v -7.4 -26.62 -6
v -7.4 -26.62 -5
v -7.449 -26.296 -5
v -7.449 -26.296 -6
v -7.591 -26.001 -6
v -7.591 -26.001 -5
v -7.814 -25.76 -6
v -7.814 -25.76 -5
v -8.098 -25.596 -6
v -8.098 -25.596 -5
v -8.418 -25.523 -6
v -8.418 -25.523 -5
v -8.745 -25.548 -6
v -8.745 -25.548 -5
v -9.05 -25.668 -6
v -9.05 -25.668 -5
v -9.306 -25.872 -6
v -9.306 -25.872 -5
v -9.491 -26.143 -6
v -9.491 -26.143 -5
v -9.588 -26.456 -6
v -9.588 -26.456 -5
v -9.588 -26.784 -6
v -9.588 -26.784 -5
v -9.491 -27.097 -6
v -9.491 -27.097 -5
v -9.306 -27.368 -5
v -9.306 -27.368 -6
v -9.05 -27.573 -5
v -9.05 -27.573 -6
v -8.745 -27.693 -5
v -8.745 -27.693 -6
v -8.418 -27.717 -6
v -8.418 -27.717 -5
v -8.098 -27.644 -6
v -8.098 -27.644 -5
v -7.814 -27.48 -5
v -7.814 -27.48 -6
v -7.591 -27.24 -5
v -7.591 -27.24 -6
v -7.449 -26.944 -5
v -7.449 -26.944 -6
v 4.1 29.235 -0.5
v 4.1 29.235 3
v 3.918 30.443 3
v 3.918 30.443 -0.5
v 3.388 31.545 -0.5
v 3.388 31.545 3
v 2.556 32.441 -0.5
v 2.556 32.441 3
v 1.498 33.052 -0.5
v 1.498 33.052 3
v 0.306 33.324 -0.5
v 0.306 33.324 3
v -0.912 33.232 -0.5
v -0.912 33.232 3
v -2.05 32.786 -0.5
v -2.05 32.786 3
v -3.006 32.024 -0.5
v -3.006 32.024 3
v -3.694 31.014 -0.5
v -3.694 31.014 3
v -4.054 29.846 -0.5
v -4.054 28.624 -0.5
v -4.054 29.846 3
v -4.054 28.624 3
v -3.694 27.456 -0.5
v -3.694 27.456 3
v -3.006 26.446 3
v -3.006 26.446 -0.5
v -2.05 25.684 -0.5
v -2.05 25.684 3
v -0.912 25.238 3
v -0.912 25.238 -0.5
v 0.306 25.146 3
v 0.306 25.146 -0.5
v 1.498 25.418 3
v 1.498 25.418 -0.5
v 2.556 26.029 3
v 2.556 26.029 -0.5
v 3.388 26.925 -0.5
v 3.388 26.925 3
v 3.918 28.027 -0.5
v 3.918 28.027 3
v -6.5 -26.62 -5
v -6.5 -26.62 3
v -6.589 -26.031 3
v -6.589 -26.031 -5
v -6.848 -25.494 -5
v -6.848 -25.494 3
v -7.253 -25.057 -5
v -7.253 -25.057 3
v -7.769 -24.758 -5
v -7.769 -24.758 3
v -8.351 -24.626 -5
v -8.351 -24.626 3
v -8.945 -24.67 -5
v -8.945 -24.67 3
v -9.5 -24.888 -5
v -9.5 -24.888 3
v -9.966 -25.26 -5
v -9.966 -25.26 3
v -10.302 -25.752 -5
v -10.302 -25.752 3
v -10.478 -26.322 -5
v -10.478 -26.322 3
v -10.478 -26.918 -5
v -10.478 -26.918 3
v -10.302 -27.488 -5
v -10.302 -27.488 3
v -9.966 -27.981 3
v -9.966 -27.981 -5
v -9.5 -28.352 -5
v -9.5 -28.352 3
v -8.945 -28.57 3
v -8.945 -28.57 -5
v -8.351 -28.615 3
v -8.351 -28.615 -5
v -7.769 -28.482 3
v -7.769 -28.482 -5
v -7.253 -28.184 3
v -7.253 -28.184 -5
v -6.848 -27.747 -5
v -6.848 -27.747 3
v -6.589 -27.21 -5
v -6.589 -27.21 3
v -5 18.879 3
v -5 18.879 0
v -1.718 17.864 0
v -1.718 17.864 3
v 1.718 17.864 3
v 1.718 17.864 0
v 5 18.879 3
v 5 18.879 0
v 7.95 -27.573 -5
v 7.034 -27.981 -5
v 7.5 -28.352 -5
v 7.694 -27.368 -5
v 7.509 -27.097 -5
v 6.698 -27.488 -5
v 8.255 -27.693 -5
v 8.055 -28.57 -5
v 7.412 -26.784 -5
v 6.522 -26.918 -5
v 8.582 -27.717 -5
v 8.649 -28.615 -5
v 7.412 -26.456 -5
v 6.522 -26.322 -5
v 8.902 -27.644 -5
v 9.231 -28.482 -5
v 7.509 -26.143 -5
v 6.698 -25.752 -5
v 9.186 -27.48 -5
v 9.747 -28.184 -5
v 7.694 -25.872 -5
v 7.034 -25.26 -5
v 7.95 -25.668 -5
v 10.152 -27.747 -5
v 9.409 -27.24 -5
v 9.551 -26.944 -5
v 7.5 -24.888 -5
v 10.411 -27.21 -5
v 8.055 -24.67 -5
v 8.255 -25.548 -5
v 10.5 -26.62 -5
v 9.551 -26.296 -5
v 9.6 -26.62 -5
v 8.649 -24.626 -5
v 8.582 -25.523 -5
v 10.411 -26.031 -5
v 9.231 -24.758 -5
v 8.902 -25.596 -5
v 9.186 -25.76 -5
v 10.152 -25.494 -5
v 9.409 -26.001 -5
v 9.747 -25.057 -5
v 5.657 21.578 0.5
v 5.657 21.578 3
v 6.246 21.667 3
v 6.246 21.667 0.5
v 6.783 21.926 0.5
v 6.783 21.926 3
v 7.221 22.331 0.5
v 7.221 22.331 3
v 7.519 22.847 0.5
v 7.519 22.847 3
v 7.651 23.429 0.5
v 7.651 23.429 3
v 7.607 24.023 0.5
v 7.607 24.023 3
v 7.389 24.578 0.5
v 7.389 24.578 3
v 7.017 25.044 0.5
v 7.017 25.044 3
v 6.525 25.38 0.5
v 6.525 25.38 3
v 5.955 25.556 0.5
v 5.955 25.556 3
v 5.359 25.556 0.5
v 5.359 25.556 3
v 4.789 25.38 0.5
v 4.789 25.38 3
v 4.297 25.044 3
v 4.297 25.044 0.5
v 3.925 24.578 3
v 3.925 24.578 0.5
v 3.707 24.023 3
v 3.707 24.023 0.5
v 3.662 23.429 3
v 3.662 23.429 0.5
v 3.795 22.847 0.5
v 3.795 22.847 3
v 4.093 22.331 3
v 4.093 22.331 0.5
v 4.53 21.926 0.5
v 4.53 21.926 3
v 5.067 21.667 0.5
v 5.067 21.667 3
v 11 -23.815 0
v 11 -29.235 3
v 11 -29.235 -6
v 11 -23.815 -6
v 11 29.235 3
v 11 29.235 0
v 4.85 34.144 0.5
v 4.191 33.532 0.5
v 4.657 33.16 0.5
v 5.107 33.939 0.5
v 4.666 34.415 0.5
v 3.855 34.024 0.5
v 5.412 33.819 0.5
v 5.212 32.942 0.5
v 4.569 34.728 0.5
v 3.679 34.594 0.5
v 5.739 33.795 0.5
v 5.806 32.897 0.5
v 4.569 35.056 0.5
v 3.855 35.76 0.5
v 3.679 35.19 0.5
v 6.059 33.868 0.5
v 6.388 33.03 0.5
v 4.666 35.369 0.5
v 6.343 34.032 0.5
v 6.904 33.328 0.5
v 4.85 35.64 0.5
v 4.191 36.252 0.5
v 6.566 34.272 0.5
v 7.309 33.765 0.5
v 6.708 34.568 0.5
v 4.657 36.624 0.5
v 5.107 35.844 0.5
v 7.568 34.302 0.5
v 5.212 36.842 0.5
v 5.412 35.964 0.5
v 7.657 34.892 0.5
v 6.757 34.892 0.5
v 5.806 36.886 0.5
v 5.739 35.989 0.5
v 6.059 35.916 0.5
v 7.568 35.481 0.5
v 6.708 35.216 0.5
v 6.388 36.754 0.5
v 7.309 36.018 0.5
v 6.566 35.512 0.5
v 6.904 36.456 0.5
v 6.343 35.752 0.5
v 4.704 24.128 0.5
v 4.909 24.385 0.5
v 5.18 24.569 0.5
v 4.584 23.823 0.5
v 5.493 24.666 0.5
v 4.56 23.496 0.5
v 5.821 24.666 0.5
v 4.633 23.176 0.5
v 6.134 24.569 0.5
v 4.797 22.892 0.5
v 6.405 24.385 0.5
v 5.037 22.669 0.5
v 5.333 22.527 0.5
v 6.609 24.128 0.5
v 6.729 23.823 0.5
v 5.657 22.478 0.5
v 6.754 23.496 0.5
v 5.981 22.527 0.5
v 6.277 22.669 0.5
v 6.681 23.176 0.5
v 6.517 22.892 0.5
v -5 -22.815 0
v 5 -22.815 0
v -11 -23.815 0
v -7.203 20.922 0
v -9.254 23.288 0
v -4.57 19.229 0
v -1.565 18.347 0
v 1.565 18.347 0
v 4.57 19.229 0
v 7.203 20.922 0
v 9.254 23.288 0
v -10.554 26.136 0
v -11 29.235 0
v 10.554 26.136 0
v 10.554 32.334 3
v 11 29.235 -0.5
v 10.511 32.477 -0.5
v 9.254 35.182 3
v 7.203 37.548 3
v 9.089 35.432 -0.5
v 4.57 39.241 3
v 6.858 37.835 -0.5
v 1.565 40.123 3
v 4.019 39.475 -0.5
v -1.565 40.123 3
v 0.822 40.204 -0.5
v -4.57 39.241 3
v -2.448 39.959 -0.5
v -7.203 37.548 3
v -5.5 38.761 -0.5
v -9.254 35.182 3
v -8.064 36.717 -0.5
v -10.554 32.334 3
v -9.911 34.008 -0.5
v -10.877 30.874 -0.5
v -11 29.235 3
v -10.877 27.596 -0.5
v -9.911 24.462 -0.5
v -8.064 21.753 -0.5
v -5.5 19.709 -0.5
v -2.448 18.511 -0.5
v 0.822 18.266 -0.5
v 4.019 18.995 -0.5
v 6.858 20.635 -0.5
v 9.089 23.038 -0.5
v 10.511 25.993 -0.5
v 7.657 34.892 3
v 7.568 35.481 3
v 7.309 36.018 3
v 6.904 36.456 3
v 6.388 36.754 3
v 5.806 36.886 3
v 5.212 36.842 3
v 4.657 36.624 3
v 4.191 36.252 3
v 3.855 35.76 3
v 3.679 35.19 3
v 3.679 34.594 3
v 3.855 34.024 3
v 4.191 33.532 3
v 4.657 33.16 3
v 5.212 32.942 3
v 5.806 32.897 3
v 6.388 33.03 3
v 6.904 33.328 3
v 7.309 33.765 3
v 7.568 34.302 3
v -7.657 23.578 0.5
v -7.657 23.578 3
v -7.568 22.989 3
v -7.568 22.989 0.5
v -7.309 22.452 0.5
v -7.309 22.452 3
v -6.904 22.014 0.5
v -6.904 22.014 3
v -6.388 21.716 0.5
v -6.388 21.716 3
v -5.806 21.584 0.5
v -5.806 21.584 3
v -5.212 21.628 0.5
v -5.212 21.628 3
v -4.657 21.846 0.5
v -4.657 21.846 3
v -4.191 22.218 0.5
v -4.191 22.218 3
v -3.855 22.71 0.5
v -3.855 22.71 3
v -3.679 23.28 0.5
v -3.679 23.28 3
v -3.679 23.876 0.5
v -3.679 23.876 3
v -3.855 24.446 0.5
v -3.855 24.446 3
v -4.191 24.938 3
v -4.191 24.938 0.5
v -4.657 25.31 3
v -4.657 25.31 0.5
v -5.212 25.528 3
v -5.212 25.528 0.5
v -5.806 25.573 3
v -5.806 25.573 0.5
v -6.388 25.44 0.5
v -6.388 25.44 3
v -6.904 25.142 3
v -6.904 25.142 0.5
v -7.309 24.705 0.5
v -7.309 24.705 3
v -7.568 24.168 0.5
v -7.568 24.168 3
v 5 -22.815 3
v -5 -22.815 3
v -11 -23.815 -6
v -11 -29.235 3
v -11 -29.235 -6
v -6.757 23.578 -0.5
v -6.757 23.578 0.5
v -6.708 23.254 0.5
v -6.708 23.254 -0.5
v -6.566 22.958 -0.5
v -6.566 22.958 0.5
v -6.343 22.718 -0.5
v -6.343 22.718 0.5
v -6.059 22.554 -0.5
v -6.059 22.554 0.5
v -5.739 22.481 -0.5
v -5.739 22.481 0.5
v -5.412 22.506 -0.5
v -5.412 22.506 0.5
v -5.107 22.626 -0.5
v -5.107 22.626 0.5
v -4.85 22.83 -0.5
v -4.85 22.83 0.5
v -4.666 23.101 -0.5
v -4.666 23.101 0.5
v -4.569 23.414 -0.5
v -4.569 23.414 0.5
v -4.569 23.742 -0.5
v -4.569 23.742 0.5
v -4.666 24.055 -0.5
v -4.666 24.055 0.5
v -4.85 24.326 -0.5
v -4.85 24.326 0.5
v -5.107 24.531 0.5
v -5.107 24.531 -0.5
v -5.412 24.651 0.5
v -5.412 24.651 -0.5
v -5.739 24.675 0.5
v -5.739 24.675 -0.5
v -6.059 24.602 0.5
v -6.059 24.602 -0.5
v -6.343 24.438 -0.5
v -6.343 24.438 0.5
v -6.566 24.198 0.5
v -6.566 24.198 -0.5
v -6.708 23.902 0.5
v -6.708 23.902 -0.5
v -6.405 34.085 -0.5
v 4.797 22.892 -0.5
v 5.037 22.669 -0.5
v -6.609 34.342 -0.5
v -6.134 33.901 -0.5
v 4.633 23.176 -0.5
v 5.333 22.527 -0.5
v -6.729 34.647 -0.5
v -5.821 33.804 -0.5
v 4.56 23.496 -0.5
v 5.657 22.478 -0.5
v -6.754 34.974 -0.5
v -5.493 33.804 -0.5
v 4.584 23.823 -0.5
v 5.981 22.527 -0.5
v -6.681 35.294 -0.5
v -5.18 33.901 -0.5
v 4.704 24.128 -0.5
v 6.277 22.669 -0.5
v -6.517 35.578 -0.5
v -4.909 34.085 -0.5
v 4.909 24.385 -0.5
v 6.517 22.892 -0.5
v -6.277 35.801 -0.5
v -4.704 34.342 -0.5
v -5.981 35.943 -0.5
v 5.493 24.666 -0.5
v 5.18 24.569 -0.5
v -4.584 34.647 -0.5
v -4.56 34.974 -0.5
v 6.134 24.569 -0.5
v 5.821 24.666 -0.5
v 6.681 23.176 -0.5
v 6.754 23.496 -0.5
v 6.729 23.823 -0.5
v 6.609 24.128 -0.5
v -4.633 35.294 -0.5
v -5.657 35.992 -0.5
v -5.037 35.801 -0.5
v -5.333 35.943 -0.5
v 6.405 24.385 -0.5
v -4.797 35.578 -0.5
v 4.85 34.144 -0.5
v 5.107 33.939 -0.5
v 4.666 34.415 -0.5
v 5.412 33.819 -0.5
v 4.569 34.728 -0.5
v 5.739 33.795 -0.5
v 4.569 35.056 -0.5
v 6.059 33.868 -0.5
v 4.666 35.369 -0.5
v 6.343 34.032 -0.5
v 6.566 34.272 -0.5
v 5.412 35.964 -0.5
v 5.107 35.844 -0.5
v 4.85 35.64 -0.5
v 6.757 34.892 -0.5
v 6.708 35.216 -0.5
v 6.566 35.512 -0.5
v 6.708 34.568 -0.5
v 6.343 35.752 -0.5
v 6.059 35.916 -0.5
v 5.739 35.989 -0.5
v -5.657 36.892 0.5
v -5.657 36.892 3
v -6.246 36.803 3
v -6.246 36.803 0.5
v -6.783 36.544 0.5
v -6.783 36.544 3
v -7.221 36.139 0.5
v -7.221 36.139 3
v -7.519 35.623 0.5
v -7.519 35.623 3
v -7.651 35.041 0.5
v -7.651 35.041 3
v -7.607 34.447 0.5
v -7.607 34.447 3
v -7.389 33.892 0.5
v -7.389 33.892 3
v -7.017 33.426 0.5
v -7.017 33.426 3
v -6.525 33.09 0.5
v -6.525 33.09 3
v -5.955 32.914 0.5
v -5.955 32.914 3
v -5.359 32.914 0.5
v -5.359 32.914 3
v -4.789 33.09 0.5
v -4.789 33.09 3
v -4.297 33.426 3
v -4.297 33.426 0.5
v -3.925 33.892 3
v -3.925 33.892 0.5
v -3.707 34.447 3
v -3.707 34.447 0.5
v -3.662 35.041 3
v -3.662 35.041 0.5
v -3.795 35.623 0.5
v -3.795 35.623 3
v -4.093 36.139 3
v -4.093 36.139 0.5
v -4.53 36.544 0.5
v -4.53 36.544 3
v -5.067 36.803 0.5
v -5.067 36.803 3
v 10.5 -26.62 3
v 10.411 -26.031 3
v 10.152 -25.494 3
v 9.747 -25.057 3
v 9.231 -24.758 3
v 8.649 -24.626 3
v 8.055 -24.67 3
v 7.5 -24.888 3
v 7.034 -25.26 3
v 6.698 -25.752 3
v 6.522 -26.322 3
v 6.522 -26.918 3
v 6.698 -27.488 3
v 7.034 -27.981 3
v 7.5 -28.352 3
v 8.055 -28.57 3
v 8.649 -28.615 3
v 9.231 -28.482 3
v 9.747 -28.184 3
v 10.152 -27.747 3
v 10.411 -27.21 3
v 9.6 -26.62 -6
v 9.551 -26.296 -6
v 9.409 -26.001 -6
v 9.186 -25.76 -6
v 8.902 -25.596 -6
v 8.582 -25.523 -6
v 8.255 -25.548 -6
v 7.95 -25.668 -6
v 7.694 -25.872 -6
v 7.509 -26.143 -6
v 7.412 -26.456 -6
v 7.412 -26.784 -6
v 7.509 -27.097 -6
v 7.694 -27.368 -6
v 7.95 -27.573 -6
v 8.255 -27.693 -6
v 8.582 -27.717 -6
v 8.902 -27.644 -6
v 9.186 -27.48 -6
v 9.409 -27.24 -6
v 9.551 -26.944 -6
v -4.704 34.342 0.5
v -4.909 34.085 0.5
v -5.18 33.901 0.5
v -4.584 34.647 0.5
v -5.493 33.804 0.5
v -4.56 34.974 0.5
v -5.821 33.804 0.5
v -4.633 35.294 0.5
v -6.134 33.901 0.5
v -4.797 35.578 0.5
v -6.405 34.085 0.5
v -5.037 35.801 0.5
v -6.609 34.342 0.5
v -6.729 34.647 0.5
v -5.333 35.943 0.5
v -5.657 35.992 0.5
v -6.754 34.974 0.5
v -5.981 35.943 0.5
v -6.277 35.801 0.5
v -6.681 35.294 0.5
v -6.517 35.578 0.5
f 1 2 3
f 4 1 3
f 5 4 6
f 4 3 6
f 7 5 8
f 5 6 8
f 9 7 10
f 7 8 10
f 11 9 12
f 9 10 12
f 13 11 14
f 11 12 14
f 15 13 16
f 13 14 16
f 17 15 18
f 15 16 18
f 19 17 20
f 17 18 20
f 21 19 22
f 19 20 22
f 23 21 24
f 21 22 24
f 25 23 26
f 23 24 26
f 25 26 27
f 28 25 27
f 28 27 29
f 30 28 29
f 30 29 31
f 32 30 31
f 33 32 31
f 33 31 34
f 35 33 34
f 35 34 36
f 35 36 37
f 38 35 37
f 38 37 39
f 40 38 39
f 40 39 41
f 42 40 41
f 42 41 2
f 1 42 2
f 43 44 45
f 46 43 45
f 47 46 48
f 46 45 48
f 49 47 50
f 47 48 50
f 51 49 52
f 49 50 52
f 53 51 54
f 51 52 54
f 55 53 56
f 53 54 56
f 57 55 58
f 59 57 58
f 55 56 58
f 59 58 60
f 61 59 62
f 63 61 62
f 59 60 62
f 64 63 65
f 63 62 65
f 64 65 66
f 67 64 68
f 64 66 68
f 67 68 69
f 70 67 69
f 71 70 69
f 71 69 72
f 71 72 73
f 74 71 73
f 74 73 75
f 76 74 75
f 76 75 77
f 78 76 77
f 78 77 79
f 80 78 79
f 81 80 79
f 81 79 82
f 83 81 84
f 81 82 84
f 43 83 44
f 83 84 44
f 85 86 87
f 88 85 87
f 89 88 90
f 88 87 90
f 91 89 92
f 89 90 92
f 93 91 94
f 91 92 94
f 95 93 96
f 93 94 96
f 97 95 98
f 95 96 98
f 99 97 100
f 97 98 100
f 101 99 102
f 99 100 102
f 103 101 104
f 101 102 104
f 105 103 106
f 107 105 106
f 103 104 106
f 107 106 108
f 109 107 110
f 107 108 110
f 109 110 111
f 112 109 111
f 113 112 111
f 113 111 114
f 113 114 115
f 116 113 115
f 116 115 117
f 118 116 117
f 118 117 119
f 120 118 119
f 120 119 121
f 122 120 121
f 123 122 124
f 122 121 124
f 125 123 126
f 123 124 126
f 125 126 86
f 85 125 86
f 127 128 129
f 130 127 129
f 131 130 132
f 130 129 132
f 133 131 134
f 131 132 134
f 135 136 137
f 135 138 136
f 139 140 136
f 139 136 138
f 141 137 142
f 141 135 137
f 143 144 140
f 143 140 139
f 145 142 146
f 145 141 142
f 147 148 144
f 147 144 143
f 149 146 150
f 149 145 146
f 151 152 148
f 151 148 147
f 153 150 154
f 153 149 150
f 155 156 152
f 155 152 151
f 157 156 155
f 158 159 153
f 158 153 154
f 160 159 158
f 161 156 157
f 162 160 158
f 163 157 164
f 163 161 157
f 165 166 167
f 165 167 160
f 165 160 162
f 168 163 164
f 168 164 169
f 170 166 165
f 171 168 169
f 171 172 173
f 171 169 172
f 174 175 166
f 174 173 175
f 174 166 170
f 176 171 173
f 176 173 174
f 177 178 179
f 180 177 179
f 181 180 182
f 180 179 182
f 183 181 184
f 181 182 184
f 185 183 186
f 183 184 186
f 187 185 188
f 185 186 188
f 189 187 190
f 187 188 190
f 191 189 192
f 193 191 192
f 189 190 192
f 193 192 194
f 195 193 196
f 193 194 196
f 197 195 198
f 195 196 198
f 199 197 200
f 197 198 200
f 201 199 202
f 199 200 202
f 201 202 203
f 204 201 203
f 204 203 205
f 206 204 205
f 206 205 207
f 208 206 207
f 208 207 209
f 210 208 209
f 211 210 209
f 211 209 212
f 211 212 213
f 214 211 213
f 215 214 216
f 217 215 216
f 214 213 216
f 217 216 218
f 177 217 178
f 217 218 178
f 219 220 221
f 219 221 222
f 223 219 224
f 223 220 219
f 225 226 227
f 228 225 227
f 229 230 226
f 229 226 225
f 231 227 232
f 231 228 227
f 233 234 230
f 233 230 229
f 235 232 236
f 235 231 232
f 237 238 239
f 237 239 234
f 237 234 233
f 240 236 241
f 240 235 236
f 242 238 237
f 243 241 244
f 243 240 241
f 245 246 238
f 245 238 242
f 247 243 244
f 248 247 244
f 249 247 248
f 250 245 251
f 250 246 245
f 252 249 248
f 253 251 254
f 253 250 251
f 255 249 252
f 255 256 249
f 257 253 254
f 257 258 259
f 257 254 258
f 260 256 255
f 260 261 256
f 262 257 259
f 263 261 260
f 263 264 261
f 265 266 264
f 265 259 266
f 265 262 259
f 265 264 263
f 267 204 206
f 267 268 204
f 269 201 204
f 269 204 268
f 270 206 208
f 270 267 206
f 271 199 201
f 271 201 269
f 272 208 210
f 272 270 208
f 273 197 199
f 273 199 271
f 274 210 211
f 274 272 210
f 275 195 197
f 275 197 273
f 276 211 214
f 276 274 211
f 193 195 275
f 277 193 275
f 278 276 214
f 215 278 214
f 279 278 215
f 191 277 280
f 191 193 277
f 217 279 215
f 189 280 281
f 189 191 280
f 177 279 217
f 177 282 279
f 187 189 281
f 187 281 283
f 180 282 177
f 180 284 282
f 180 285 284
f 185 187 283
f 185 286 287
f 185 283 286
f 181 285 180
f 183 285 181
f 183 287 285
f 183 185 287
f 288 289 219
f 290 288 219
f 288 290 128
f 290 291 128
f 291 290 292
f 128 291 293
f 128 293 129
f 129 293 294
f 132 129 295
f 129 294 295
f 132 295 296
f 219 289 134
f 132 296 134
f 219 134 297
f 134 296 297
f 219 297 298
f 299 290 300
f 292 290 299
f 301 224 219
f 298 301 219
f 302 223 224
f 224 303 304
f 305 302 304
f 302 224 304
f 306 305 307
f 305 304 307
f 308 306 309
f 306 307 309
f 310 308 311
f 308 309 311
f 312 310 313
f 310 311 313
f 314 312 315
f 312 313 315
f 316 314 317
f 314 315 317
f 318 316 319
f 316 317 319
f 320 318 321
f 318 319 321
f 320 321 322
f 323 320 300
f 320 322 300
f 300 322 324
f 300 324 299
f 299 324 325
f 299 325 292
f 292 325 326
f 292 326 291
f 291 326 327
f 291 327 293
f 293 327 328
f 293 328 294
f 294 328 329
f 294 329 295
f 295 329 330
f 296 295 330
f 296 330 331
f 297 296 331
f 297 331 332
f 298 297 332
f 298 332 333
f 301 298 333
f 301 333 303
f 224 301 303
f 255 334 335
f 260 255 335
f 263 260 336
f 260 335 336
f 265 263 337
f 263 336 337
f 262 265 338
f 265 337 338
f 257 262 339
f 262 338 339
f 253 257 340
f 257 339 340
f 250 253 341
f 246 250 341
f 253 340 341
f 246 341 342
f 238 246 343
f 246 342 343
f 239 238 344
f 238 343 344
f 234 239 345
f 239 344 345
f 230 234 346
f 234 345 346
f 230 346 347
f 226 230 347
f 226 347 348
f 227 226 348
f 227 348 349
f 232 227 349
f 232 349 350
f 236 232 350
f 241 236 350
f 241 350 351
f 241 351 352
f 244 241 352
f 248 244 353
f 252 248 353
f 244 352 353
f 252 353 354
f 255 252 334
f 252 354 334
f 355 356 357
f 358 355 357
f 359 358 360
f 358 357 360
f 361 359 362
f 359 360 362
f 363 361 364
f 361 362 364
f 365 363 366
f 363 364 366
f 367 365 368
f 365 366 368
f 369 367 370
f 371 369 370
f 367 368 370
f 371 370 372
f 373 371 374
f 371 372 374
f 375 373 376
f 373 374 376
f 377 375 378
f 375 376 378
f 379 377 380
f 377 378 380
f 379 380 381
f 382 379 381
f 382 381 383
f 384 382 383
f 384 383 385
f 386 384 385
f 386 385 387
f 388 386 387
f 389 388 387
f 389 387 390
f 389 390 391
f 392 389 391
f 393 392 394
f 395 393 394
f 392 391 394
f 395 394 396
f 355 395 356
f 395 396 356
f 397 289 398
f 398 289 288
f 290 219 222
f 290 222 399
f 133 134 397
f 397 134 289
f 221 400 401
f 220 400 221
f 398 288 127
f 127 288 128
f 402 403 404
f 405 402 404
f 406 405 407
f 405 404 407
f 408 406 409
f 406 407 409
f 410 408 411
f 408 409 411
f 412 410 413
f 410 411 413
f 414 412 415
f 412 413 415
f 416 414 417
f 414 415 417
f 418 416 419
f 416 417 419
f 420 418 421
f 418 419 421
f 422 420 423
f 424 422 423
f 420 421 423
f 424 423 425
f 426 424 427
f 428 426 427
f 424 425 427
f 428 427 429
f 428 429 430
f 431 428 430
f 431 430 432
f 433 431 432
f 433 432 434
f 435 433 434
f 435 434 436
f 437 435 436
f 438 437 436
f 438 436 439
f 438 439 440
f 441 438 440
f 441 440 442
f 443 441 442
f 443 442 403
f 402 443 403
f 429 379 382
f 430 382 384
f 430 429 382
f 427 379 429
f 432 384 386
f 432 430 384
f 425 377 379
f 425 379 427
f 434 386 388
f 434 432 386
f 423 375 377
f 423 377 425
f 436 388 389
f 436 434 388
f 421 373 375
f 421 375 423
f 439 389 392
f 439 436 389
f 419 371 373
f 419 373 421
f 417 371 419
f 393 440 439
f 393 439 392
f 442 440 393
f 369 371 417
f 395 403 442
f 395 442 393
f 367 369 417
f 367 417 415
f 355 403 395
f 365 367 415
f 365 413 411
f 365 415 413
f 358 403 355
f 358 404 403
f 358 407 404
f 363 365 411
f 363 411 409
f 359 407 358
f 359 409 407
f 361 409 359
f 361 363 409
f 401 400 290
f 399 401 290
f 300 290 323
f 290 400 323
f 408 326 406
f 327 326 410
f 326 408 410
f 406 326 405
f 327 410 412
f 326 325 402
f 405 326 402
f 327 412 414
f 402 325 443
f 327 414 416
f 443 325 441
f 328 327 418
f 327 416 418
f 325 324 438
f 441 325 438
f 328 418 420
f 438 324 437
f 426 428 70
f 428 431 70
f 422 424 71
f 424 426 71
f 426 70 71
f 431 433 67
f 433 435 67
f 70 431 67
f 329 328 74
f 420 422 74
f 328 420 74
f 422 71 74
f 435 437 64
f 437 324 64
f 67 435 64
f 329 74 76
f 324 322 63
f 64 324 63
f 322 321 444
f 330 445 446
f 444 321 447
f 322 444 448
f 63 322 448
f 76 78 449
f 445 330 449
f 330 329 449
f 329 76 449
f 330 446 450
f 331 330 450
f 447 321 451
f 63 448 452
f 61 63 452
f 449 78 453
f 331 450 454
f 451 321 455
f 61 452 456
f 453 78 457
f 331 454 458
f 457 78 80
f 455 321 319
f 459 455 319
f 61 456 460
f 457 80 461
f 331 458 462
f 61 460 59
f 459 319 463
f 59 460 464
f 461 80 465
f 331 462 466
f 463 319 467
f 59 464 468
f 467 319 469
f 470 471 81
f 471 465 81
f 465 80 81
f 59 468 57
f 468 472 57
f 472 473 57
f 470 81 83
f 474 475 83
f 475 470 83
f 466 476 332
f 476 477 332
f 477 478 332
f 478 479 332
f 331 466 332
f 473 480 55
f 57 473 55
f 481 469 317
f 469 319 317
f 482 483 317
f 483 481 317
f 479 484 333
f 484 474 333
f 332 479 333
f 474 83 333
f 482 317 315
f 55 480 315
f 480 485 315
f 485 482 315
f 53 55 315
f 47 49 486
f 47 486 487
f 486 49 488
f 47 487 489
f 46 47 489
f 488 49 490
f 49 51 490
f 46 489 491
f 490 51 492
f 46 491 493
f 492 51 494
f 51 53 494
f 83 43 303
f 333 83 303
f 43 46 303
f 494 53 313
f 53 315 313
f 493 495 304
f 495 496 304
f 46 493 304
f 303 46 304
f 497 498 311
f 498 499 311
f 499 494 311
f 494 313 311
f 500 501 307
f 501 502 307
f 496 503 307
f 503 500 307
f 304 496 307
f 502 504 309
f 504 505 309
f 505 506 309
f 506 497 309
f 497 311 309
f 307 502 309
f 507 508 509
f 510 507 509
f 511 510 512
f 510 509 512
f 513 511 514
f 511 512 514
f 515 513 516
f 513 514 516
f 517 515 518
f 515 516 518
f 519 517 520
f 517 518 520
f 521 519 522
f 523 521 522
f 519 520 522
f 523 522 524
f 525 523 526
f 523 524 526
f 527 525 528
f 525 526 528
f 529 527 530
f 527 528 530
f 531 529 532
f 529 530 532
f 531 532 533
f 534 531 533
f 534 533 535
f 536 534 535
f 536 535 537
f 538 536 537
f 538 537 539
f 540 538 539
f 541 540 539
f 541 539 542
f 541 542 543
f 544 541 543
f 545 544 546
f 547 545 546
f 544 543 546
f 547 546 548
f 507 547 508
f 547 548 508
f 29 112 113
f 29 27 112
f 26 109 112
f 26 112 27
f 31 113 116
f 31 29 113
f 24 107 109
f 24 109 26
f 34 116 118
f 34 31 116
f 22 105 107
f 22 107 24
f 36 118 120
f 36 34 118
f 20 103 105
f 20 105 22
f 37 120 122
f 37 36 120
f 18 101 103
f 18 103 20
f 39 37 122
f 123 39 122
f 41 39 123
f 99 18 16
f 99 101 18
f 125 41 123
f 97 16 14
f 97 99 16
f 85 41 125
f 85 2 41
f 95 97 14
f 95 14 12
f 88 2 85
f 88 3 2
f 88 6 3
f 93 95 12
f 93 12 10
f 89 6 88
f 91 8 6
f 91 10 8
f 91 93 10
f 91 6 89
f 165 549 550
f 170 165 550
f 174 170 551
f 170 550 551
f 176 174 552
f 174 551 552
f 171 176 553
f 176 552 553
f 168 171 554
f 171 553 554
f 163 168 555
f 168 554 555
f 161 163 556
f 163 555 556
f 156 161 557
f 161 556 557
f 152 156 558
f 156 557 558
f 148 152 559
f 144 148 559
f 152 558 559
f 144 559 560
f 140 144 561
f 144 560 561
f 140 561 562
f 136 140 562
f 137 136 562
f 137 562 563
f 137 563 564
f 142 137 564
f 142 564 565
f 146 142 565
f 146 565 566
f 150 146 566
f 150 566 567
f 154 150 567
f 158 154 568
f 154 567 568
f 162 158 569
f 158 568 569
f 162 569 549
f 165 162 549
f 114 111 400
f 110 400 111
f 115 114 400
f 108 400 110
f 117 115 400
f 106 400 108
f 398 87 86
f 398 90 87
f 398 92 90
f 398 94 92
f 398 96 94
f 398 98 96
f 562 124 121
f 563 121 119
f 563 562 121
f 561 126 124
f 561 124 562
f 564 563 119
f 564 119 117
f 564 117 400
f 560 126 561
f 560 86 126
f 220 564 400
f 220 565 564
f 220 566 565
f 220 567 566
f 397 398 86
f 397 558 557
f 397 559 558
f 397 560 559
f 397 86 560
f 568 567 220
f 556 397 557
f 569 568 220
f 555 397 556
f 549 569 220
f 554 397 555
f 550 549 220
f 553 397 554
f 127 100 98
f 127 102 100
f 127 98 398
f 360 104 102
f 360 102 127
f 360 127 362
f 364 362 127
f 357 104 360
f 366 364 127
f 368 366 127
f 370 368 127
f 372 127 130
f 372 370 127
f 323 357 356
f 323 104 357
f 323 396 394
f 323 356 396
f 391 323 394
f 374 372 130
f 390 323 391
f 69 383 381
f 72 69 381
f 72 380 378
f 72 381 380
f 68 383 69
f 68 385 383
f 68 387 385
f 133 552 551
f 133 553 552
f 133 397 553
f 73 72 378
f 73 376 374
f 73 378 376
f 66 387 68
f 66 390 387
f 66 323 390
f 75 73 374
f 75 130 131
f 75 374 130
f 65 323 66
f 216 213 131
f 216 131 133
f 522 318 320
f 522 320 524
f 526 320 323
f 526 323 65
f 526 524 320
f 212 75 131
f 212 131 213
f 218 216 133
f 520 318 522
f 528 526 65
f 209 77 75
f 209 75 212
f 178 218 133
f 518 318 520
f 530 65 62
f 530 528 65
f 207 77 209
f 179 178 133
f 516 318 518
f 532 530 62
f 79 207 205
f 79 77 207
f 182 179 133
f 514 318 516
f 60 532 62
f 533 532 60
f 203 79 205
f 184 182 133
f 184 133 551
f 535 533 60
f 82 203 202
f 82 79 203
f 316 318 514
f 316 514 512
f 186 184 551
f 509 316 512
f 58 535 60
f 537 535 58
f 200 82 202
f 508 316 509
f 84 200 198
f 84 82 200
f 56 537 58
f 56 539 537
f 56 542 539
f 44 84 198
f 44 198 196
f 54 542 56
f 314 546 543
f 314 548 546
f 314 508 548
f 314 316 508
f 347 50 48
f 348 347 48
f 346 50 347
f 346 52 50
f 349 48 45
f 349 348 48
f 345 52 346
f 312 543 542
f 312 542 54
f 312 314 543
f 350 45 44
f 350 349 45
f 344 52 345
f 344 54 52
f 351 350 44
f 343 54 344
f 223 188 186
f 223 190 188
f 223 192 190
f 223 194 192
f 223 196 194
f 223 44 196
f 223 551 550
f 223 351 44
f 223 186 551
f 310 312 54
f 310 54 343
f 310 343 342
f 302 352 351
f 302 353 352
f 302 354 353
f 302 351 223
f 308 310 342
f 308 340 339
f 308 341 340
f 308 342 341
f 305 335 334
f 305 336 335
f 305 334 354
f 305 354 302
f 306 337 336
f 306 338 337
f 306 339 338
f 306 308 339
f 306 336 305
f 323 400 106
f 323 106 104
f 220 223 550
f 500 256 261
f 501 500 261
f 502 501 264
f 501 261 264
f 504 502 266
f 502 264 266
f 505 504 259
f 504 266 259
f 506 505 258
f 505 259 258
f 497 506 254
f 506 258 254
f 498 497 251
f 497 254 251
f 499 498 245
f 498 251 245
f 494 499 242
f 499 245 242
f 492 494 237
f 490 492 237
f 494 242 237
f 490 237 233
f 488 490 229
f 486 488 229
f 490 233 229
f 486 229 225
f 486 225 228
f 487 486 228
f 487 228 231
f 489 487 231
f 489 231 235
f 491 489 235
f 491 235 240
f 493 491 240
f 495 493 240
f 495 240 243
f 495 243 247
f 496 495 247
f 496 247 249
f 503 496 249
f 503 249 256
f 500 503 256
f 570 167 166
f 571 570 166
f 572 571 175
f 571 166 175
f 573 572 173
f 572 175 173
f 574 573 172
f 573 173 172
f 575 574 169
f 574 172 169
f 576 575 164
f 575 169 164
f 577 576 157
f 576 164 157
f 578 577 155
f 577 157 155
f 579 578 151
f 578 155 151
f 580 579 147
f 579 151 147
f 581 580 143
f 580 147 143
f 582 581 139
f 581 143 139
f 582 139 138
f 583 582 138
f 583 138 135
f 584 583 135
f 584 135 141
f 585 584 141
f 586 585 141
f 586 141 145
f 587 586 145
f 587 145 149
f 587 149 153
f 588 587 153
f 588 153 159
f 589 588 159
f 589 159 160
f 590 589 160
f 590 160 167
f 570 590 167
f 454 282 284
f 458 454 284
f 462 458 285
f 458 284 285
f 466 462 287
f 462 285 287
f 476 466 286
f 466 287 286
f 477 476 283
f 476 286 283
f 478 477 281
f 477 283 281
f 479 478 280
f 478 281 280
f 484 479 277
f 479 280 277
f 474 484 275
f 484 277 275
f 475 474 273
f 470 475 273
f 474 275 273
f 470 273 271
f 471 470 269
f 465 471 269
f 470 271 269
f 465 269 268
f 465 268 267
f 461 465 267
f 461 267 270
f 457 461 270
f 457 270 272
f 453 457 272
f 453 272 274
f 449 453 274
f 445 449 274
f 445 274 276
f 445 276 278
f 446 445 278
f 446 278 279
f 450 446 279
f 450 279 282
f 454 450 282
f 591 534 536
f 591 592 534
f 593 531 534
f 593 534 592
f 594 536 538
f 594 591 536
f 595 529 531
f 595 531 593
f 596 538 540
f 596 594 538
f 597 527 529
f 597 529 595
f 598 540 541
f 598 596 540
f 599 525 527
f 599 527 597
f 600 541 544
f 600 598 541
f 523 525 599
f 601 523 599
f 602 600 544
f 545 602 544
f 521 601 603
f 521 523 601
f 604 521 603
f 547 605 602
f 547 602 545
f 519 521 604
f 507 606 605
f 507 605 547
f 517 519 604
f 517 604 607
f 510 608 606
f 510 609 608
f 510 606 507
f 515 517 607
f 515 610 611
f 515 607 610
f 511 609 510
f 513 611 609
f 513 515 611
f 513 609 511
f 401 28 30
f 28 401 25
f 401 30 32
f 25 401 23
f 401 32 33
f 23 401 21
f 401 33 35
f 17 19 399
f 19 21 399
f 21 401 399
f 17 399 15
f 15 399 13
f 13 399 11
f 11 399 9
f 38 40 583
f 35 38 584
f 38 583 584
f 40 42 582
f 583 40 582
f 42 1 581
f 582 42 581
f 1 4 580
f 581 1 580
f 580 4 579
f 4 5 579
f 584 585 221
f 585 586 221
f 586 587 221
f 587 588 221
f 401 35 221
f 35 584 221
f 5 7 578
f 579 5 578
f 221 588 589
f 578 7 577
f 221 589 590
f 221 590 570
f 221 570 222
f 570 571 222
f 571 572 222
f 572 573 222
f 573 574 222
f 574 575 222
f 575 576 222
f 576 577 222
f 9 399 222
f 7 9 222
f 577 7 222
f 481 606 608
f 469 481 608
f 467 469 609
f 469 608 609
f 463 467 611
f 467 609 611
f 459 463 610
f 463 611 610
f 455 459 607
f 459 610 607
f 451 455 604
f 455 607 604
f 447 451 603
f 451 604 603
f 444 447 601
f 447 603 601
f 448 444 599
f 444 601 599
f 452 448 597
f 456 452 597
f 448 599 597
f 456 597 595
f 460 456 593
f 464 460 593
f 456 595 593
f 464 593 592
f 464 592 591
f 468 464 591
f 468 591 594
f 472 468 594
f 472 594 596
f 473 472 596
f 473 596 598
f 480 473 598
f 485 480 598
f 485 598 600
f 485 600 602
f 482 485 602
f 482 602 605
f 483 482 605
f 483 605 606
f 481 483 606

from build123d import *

# Parameters (mm, degrees)
BOSS_EXTRUDE1_DEPTH = 3
BOSS_EXTRUDE2_START = -0.5
SKETCH1_3_R         = 11
BOSS_EXTRUDE2_DEPTH = 0.5
SKETCH2_R           = 4.1
SKETCH2_R_2         = 1.1
CUT_EXTRUDE1_DEPTH  = 3.5
SKETCH2_3_R         = 2
CUT_EXTRUDE2_DEPTH  = 2.5
CIRPATTERN2_COUNT   = 4
SKETCH1_6_W         = 11
SKETCH1_6_H         = 5.42
BOSS_EXTRUDE3_DEPTH = 6
SKETCH3_R           = 1.1
CUT_EXTRUDE3_DEPTH  = 9
SKETCH3_3_R         = 2
SKETCH3_3_R_2       = 1.1
CUT_EXTRUDE4_DEPTH  = 8


with BuildPart() as part:
    # Sketch1 → Boss-Extrude1 (new body)
    with BuildSketch(Plane.XY):
        with BuildLine():
            Line((-11, 29.235), (-11, -29.235))
            Line((-11, -29.235), (11, -29.235))
            Line((11, -29.235), (11, 29.235))
            ThreePointArc((11, 29.235), (0, 40.235), (-11, 29.235))
        make_face()
        with BuildLine():
            Line((5, -22.815), (-5, -22.815))
            Line((-5, -22.815), (-5, 18.878842411))
            ThreePointArc((-5, 18.878842411), (0, 17.735), (5, 18.878842411))
            Line((5, 18.878842411), (5, -22.815))
        make_face(mode=Mode.SUBTRACT)
    extrude(amount=BOSS_EXTRUDE1_DEPTH)

    # Sketch1<3> → Boss-Extrude2 (add)
    with BuildSketch(Plane.XY.offset(BOSS_EXTRUDE2_START)):
        with Locations((0, 29.235)):
            Circle(SKETCH1_3_R)
    extrude(amount=BOSS_EXTRUDE2_DEPTH)

    # Sketch2 → Cut-Extrude1 (cut)
    with BuildSketch(Plane.XY.offset(3)):
        with Locations((0, 29.235)):
            Circle(SKETCH2_R)
        with Locations((5.656854249, 34.891854249)):
            Circle(SKETCH2_R_2)
    cut_extrude1 = extrude(amount=-CUT_EXTRUDE1_DEPTH, mode=Mode.SUBTRACT)

    # Sketch2<3> → Cut-Extrude2 (cut)
    with BuildSketch(Plane.XY.offset(3)):
        with Locations((5.656854249, 34.891854249)):
            Circle(SKETCH2_3_R)
    cut_extrude2 = extrude(amount=-CUT_EXTRUDE2_DEPTH, mode=Mode.SUBTRACT)

    # CirPattern2: Cut-Extrude1, Cut-Extrude2 ×4 about axis
    cirpattern2_axis = Axis((0, 29.235, 0), (0, 0, 1))
    add([cut_extrude1.rotate(cirpattern2_axis, i * 360 / CIRPATTERN2_COUNT) for i in range(1, CIRPATTERN2_COUNT)], mode=Mode.SUBTRACT)
    add([cut_extrude2.rotate(cirpattern2_axis, i * 360 / CIRPATTERN2_COUNT) for i in range(1, CIRPATTERN2_COUNT)], mode=Mode.SUBTRACT)

    # Sketch1<6> → Boss-Extrude3 (add)
    with BuildSketch(Plane.XY):
        with Locations((-5.5, -26.525)):
            Rectangle(SKETCH1_6_W, SKETCH1_6_H)
        with Locations((5.5, -26.525)):
            Rectangle(SKETCH1_6_W, SKETCH1_6_H)
    extrude(amount=-BOSS_EXTRUDE3_DEPTH)

    # Sketch3 → Cut-Extrude3 (cut)
    with BuildSketch(Plane.XY.offset(3)):
        with Locations((-8.5, -26.62018786)):
            Circle(SKETCH3_R)
        with Locations((8.5, -26.62018786)):
            Circle(SKETCH3_R)
    extrude(amount=-CUT_EXTRUDE3_DEPTH, mode=Mode.SUBTRACT)

    # Sketch3<3> → Cut-Extrude4 (cut)
    # profile 1 of 2: a face of its own
    with BuildSketch(Plane.XY.offset(3)):
        with Locations((-8.5, -26.62018786)):
            Circle(SKETCH3_3_R)
        with Locations((-8.5, -26.62018786)):
            Circle(SKETCH3_3_R_2, mode=Mode.SUBTRACT)
    # profile 2 of 2: a face of its own
    with BuildSketch(Plane.XY.offset(3)):
        with Locations((8.5, -26.62018786)):
            Circle(SKETCH3_3_R)
        with Locations((8.5, -26.62018786)):
            Circle(SKETCH3_3_R_2, mode=Mode.SUBTRACT)
    extrude(amount=-CUT_EXTRUDE4_DEPTH, mode=Mode.SUBTRACT)


solid = part.part
